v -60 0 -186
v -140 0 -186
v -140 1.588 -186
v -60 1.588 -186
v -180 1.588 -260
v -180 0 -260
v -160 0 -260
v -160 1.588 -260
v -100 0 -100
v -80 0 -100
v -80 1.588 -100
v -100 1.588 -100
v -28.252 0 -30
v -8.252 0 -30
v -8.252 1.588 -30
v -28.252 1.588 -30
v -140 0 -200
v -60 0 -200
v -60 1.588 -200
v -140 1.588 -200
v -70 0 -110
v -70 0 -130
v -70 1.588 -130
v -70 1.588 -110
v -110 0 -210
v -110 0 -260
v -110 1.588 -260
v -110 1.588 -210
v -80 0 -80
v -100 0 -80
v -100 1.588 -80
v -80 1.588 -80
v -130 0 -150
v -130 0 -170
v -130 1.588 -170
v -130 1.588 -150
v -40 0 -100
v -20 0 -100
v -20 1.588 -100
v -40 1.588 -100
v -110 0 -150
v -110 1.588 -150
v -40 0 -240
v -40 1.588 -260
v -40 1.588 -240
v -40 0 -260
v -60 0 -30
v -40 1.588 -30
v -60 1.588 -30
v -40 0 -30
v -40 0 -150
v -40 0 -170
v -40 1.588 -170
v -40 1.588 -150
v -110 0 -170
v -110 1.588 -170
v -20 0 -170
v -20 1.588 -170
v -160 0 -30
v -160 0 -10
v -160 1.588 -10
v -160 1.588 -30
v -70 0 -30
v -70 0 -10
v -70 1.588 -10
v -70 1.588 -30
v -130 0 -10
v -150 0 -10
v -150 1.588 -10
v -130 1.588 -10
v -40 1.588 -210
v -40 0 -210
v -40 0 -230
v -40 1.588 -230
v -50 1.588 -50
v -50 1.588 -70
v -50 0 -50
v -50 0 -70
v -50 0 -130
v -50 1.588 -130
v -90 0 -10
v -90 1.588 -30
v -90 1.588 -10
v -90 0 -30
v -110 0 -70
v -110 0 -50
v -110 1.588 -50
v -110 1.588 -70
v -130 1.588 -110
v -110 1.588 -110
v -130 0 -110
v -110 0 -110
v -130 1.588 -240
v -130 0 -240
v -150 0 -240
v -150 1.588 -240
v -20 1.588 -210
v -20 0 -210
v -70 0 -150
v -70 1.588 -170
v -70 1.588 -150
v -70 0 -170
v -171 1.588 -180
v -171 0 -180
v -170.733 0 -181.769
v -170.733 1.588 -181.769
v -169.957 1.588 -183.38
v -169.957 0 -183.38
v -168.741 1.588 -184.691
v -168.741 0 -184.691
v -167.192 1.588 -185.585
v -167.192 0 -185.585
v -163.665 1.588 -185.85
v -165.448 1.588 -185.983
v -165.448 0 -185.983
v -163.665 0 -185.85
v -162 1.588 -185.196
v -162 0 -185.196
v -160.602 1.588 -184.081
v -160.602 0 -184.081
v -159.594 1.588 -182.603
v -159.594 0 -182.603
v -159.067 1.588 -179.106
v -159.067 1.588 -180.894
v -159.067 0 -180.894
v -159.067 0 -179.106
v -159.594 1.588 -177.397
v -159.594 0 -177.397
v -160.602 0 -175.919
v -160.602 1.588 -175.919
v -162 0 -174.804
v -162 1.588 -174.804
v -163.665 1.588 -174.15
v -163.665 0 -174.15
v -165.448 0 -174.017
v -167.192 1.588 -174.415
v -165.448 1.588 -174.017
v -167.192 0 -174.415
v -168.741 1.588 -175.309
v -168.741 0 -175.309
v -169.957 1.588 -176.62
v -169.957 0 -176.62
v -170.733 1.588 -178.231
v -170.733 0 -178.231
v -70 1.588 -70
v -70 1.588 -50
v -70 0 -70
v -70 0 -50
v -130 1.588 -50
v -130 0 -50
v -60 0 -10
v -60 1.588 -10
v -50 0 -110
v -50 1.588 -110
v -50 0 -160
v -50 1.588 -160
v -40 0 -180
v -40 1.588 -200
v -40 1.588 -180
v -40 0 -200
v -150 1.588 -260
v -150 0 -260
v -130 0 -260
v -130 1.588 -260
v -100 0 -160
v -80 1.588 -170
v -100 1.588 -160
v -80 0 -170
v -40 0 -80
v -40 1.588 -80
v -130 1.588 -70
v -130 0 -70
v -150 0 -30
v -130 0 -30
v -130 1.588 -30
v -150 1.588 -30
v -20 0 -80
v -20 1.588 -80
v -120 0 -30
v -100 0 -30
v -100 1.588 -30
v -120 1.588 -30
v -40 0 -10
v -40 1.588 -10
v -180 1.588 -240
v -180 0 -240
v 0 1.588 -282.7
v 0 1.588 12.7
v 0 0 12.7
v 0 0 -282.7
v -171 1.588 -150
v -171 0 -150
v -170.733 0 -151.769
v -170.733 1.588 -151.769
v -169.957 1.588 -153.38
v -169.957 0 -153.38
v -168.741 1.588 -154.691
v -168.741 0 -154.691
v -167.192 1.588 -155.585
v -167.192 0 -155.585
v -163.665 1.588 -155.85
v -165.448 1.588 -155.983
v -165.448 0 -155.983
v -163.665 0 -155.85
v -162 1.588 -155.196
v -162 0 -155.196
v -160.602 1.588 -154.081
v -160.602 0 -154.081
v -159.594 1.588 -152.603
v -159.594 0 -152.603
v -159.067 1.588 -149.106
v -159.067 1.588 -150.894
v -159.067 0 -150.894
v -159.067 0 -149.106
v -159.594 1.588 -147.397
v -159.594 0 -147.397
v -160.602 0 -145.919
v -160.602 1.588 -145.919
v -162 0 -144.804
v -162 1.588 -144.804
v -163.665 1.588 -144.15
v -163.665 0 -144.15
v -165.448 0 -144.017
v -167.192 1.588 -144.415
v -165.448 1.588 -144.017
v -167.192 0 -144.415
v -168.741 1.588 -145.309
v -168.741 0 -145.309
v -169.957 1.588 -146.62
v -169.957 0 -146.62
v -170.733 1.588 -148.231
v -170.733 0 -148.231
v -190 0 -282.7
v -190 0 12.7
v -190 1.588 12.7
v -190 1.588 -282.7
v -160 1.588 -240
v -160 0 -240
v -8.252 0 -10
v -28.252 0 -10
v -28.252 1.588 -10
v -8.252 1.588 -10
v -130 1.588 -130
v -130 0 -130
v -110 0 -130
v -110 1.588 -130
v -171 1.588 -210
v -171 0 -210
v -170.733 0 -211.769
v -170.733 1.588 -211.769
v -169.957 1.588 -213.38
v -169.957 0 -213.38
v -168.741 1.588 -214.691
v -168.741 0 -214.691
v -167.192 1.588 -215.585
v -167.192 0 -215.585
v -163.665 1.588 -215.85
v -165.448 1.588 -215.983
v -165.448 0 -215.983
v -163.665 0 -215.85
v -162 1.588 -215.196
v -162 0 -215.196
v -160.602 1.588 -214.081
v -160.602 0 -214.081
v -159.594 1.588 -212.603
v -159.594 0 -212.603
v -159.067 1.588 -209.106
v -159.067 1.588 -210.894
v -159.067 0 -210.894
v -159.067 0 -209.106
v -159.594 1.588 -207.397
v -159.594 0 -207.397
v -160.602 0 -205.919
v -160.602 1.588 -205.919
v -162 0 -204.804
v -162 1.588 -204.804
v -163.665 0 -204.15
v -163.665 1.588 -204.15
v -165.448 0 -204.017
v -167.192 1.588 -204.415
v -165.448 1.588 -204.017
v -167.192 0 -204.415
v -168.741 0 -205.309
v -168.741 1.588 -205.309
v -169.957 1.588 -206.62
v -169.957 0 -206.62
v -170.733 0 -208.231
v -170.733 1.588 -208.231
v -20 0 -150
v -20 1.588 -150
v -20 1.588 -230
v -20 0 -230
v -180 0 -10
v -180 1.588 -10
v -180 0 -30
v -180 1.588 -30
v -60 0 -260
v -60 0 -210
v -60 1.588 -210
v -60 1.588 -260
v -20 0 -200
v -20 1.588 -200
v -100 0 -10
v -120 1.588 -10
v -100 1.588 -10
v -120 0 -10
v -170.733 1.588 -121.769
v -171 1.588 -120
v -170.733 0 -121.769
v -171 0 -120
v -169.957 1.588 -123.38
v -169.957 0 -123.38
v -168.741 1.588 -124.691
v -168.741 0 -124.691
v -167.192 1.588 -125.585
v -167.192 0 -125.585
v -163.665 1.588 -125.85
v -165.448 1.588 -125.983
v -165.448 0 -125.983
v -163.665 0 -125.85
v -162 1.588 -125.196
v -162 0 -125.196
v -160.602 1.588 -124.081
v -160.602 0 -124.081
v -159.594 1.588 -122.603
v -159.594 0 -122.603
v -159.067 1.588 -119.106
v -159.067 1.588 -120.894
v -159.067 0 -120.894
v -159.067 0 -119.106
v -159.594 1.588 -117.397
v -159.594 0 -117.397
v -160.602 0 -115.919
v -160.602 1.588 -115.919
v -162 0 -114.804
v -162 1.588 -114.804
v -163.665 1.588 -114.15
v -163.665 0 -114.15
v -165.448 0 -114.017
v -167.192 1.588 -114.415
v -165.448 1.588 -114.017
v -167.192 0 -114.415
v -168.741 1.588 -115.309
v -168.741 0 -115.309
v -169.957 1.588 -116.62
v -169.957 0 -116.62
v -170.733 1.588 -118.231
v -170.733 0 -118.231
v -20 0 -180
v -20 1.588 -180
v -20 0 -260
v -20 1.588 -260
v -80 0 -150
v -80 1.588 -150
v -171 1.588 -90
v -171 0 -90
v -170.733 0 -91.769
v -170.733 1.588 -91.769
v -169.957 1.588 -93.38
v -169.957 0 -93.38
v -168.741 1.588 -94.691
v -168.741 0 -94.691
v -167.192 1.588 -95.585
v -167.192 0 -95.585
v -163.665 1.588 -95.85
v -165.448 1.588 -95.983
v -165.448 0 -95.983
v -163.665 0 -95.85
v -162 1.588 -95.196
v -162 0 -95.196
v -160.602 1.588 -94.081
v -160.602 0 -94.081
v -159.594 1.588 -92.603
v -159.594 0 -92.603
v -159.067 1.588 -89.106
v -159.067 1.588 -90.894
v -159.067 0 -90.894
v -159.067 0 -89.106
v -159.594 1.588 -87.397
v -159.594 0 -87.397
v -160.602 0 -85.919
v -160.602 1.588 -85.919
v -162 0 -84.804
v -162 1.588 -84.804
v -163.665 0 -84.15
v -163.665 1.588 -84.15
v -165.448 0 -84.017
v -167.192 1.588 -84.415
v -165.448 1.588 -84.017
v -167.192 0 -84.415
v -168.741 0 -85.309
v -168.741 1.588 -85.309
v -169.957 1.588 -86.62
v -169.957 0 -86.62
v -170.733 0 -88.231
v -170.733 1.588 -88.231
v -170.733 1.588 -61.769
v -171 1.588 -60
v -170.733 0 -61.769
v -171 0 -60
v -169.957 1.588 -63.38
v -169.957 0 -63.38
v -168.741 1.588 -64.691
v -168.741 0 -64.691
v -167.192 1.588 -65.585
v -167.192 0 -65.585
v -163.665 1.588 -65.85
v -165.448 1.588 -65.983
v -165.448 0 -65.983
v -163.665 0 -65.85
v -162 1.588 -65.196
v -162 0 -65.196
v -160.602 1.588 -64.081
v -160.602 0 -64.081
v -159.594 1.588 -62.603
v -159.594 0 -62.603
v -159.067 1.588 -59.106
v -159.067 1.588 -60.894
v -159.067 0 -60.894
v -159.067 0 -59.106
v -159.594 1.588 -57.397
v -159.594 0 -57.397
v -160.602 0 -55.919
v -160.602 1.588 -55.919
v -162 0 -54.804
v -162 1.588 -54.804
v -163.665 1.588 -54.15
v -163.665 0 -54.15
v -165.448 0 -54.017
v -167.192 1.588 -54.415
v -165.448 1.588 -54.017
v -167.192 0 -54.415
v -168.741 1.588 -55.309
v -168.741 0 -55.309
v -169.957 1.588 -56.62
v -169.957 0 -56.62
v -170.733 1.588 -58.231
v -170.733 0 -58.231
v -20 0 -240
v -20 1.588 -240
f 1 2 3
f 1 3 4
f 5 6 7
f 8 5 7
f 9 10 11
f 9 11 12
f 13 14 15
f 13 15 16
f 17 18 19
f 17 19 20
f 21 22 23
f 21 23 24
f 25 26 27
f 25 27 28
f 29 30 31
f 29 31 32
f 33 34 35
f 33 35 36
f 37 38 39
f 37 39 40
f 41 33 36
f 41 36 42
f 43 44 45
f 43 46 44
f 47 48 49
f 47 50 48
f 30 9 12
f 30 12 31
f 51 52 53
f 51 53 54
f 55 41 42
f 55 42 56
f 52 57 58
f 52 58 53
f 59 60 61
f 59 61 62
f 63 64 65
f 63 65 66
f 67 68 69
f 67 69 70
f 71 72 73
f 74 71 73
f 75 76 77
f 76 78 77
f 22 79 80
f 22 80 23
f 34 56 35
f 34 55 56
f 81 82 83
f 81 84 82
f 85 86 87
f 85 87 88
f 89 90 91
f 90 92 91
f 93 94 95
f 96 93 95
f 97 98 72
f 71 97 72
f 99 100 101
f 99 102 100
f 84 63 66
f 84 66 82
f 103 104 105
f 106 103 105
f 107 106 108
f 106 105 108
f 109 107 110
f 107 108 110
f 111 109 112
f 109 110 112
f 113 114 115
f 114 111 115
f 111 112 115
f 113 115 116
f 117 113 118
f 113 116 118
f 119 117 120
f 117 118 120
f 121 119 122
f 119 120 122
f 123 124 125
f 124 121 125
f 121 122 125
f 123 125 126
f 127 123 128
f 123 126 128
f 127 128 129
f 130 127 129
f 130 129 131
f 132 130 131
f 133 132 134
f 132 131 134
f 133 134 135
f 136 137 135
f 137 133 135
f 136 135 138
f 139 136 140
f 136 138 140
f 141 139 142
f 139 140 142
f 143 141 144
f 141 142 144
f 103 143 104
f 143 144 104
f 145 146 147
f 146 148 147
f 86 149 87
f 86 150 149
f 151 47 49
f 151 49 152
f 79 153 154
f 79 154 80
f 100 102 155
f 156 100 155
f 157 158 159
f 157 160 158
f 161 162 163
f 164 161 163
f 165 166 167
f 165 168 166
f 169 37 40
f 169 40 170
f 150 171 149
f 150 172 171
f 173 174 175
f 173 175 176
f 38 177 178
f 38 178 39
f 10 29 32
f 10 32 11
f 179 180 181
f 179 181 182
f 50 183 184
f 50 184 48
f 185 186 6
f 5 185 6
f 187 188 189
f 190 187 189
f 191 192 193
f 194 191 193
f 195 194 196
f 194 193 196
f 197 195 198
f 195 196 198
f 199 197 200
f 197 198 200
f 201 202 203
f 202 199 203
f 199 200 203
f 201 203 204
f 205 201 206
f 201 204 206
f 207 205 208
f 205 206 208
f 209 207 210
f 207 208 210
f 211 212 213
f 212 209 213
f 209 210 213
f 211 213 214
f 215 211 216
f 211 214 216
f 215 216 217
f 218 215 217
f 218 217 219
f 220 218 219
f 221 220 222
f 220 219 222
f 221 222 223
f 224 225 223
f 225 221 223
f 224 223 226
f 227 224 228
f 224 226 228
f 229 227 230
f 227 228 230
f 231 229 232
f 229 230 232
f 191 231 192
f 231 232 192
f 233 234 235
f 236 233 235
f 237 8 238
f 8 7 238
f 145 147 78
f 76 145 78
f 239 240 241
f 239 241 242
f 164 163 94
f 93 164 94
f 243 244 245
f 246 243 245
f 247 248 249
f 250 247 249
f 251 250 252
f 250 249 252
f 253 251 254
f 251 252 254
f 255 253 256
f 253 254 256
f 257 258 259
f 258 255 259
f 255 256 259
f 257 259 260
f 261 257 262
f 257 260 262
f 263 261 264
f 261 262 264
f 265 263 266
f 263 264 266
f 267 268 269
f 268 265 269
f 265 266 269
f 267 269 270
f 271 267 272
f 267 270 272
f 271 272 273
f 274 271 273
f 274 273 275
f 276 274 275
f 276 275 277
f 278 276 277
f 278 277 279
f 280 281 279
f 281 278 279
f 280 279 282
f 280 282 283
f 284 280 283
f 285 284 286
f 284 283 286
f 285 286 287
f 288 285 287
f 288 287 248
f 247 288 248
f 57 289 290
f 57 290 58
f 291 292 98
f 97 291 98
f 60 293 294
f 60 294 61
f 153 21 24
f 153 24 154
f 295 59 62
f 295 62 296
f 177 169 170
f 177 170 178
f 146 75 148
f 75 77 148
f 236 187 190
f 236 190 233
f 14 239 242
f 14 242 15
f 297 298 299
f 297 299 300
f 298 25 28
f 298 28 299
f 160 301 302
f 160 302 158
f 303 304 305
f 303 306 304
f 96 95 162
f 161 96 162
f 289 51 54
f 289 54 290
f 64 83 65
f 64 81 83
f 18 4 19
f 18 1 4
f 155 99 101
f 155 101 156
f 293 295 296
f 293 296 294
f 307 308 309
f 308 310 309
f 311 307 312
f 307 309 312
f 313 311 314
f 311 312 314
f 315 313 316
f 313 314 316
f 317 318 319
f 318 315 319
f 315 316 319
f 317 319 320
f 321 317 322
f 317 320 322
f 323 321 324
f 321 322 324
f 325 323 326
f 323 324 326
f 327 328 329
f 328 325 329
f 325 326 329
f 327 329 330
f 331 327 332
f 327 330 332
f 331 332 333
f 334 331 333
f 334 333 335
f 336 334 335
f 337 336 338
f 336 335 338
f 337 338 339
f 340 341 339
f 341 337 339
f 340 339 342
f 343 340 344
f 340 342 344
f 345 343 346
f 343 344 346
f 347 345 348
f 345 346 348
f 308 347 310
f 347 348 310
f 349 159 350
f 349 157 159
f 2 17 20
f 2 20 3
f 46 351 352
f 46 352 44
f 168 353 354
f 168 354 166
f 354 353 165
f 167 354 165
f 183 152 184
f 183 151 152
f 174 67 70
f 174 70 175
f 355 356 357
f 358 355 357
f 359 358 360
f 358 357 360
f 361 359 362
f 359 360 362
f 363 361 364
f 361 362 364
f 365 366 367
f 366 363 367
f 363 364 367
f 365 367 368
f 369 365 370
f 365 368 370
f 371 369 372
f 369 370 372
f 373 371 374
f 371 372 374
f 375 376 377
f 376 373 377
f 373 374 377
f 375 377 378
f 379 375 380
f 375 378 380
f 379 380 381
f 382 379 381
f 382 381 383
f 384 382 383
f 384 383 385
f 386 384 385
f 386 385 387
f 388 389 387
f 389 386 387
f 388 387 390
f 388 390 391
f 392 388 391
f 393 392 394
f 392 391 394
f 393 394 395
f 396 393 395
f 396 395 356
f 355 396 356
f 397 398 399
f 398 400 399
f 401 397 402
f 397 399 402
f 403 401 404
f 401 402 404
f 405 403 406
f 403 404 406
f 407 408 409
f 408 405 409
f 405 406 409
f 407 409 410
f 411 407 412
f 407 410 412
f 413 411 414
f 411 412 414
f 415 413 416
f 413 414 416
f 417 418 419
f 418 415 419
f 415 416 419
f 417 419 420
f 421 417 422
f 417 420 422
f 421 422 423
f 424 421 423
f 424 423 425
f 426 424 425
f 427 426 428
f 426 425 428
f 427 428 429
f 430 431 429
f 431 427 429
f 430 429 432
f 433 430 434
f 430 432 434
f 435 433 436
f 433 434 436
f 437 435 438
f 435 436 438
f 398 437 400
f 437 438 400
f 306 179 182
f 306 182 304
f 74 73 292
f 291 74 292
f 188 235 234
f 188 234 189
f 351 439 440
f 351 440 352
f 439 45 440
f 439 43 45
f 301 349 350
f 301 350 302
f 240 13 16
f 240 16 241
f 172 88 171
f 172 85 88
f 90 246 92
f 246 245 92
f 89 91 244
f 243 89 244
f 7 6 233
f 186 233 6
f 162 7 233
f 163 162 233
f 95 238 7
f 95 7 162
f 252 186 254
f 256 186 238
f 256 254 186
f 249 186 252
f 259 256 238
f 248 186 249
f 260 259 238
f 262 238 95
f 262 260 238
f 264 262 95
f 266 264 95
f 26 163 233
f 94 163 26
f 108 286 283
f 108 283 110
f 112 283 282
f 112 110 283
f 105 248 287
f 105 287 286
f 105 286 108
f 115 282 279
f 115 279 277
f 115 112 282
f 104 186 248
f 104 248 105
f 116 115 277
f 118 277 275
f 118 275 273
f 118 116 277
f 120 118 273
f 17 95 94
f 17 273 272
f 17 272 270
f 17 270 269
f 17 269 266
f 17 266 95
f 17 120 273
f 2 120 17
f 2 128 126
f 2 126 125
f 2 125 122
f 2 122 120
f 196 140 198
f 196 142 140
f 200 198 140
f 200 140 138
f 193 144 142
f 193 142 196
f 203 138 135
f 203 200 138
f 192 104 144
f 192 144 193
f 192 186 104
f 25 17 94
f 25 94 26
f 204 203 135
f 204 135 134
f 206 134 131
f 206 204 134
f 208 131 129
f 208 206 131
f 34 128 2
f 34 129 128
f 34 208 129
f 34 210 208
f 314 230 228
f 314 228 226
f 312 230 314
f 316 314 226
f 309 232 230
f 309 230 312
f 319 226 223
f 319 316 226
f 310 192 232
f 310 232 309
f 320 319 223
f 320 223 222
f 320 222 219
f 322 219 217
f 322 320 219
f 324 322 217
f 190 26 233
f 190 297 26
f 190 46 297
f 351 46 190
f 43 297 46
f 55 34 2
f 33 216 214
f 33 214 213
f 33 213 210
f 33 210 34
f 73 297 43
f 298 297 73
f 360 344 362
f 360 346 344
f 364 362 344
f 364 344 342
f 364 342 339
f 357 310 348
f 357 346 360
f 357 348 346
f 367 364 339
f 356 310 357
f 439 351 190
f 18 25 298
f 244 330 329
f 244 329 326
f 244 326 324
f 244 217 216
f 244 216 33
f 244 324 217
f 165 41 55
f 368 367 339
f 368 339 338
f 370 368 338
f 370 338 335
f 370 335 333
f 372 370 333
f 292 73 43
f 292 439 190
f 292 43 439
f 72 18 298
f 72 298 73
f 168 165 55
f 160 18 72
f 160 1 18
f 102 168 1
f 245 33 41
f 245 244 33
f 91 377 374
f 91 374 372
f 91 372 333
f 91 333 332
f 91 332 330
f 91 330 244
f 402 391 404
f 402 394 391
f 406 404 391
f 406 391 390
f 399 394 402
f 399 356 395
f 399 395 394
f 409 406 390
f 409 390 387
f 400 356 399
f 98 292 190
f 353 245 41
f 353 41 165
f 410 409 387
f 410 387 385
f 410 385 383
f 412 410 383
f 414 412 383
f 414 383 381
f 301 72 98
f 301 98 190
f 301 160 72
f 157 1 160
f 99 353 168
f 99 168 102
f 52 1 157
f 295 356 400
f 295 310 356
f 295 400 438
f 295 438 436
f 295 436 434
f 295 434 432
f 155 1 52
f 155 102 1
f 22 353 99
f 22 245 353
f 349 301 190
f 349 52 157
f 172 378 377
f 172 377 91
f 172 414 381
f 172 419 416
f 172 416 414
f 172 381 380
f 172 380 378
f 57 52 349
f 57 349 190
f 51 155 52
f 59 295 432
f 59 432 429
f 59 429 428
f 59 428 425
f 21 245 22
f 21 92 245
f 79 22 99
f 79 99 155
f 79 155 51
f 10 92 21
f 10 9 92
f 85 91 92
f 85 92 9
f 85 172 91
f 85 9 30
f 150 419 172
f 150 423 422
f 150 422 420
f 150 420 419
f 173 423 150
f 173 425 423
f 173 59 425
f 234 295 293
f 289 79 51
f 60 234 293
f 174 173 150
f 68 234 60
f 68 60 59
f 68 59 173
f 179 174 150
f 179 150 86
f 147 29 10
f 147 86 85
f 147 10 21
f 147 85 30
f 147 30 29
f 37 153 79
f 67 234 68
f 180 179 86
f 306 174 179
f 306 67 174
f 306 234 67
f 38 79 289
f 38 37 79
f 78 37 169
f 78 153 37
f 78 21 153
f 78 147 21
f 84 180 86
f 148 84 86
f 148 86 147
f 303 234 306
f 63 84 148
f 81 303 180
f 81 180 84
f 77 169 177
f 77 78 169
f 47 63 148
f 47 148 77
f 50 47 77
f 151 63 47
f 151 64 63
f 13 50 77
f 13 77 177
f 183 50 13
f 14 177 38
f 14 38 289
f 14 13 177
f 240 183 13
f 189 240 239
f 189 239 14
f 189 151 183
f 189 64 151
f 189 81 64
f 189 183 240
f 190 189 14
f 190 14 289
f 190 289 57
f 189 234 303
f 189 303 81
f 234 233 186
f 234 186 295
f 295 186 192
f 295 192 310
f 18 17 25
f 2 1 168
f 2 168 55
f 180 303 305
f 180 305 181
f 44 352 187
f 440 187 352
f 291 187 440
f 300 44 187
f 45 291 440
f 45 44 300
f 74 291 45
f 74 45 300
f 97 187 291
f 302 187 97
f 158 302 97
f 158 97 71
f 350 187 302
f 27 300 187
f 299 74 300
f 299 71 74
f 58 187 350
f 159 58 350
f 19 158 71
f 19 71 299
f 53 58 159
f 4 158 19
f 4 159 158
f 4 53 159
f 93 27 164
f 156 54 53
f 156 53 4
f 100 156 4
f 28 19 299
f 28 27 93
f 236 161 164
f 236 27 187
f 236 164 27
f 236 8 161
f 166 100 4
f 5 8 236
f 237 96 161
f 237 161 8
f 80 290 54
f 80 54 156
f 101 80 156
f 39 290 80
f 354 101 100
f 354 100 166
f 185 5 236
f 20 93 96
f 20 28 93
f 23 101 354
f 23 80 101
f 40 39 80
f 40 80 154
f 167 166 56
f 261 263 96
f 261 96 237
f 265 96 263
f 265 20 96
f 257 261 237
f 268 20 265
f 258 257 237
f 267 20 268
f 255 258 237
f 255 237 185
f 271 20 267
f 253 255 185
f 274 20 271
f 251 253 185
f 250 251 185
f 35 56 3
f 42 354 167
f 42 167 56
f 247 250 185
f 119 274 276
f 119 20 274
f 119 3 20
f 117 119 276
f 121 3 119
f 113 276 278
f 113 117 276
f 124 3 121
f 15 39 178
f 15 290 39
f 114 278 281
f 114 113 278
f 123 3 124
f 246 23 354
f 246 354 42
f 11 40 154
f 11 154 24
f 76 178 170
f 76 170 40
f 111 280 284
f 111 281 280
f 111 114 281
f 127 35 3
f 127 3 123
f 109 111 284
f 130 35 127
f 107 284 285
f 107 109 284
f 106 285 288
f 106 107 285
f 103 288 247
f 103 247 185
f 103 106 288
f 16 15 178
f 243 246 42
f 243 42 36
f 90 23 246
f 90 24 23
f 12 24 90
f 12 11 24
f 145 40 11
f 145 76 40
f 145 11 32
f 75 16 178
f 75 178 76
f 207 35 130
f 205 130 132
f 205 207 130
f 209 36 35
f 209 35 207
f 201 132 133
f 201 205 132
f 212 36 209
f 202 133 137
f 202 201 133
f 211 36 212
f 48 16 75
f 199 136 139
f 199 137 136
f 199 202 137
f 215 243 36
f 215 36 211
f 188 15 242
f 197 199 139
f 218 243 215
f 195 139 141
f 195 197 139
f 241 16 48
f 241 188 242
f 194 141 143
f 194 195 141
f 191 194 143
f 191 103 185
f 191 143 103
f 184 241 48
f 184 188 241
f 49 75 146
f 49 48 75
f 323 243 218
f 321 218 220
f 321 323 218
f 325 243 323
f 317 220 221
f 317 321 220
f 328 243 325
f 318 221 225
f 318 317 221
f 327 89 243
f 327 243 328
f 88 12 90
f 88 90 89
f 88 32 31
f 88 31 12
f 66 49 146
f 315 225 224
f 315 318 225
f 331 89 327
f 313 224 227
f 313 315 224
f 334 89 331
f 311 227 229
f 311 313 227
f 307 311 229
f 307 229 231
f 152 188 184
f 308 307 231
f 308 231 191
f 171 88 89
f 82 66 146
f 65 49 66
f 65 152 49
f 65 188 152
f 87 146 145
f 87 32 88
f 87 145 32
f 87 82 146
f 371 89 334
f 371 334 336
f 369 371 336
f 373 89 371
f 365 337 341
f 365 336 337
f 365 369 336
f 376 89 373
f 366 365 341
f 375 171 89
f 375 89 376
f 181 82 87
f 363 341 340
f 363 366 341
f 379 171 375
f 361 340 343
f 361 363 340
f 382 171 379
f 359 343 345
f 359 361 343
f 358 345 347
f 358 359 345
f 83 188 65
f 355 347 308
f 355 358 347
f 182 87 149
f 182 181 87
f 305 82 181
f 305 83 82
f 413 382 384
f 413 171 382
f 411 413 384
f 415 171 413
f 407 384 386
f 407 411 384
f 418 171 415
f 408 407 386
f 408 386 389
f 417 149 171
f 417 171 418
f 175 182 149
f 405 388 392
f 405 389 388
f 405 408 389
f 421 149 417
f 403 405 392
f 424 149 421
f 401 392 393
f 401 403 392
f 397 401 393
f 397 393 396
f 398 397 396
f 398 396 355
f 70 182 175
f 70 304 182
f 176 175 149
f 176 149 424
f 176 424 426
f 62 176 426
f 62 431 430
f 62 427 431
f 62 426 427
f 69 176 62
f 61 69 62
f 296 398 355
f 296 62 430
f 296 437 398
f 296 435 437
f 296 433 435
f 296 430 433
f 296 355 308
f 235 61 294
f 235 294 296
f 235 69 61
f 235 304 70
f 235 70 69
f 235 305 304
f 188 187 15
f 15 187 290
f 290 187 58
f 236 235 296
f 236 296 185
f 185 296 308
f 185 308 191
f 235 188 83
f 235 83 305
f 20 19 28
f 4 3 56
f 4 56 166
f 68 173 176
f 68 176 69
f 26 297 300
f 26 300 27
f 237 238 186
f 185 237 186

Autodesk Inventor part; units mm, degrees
ref_plane "YZ Plane" through (0, 0, 0) normal (1, 0, 0) x (0, 1, 0)
ref_plane "XZ Plane" through (0, 0, 0) normal (0, 1, 0) x (-1, 0, 0)
ref_plane "XY Plane" through (0, 0, 0) normal (0, 0, 1) x (1, 0, 0)
sketch "Sketch1" plane through (0, 0, 0) normal (0, 1, 0) x (-1, 0, 0)
  line L0 (0, 0) -> (190, 0)
  line L1 (190, 0) -> (190, -270)
  line L2 (190, -270) -> (0, -270)
  line L3 (0, -270) -> (0, 0)
  line L4 (180, -10) -> (160, -10)
  line L5 (160, -10) -> (160, -30)
  line L6 (160, -30) -> (180, -30)
  line L7 (180, -30) -> (180, -10)
  line L8 (150, -10) -> (130, -10)
  line L9 (130, -10) -> (130, -30)
  line L10 (130, -30) -> (150, -30)
  line L11 (150, -30) -> (150, -10)
  line L12 (120, -10) -> (100, -10)
  line L13 (100, -10) -> (100, -30)
  line L14 (100, -30) -> (120, -30)
  line L15 (120, -30) -> (120, -10)
  line L16 (90, -10) -> (70, -10)
  line L17 (70, -10) -> (70, -30)
  line L18 (70, -30) -> (90, -30)
  line L19 (90, -30) -> (90, -10)
  line L20 (60, -10) -> (40, -10)
  line L21 (40, -10) -> (40, -30)
  line L22 (40, -30) -> (60, -30)
  line L23 (60, -30) -> (60, -10)
  line L24 (28.2524, -10) -> (8.2524, -10)
  line L25 (8.2524, -10) -> (8.2524, -30)
  line L26 (8.2524, -30) -> (28.2524, -30)
  line L27 (28.2524, -30) -> (28.2524, -10)
  circle A0 centre (165, -60) radius 6
  circle A1 centre (165, -90) radius 6
  circle A2 centre (165, -120) radius 6
  circle A3 centre (165, -150) radius 6
  circle A4 centre (165, -180) radius 6
  circle A5 centre (165, -210) radius 6
  line L28 (180, -260) -> (160, -260)
  line L29 (160, -260) -> (160, -240)
  line L30 (160, -240) -> (180, -240)
  line L31 (180, -240) -> (180, -260)
  line L32 (150, -260) -> (130, -260)
  line L33 (130, -260) -> (130, -240)
  line L34 (130, -240) -> (150, -240)
  line L35 (150, -240) -> (150, -260)
  line L36 (130, -50) -> (110, -50)
  line L37 (110, -50) -> (110, -70)
  line L38 (110, -70) -> (130, -70)
  line L39 (130, -70) -> (130, -50)
  line L40 (100, -80) -> (80, -80)
  line L41 (80, -80) -> (80, -100)
  line L42 (80, -100) -> (100, -100)
  line L43 (100, -100) -> (100, -80)
  line L44 (70, -70) -> (50, -70)
  line L45 (50, -70) -> (50, -50)
  line L46 (50, -50) -> (70, -50)
  line L47 (70, -50) -> (70, -70)
  line L48 (70, -110) -> (50, -110)
  line L49 (50, -110) -> (50, -130)
  line L50 (50, -130) -> (70, -130)
  line L51 (70, -130) -> (70, -110)
  line L52 (40, -80) -> (20, -80)
  line L53 (20, -80) -> (20, -100)
  line L54 (20, -100) -> (40, -100)
  line L55 (40, -100) -> (40, -80)
  line L56 (110, -110) -> (130, -110)
  line L57 (130, -110) -> (130, -130)
  line L58 (130, -130) -> (110, -130)
  line L59 (110, -130) -> (110, -110)
  line L60 (20, -260) -> (40, -260)
  line L61 (40, -260) -> (40, -240)
  line L62 (40, -240) -> (20, -240)
  line L63 (20, -240) -> (20, -260)
  line L64 (40, -230) -> (20, -230)
  line L65 (20, -230) -> (20, -210)
  line L66 (20, -210) -> (40, -210)
  line L67 (40, -210) -> (40, -230)
  line L68 (20, -200) -> (40, -200)
  line L69 (40, -200) -> (40, -180)
  line L70 (40, -180) -> (20, -180)
  line L71 (20, -180) -> (20, -200)
  line L72 (20, -170) -> (40, -170)
  line L73 (40, -170) -> (40, -150)
  line L74 (40, -150) -> (20, -150)
  line L75 (20, -150) -> (20, -170)
  line L76 (60, -260) -> (110, -260)
  line L77 (110, -260) -> (110, -210)
  line L78 (110, -210) -> (60, -210)
  line L79 (60, -210) -> (60, -260)
  line L80 (60, -200) -> (140, -200)
  line L81 (140, -200) -> (140, -186)
  line L82 (140, -186) -> (60, -186)
  line L83 (60, -186) -> (60, -200)
  line L84 (70, -170) -> (70, -150)
  line L85 (80, -150) -> (80, -170)
  line L86 (110, -170) -> (130, -170)
  line L87 (130, -170) -> (130, -150)
  line L88 (130, -150) -> (110, -150)
  line L89 (110, -150) -> (110, -170)
  line L90 (70, -150) -> (50, -160)
  line L91 (70, -170) -> (50, -160)
  line L92 (80, -150) -> (100, -160)
  line L93 (80, -170) -> (100, -160)
extrude "Extrusion1" add sketch "Sketch1" along normal blind 1.5875
sketch "Sketch2" plane through (-190, 0, 0) normal (0, 0, 1) x (1, 0, 0)
  line L0 (190, 0) -> (190, 1.5875) projected
  line L1 (0, 0) -> (0, 1.5875) projected
  line L2 (190, 1.5875) -> (0, 1.5875)
  line L3 (0, 1.5875) -> (0, 0)
  line L4 (0, 0) -> (190, 0)
  line L5 (190, 0) -> (190, 1.5875)
extrude "Extrusion2" add sketch "Sketch2" along normal blind 12.7
sketch "Sketch3" plane through (0, 0, -270) normal (0, 0, -1) x (-1, 0, 0)
  line L0 (190, 0) -> (0, 0) projected
  line L1 (0, 1.5875) -> (190, 1.5875) projected
  line L2 (0, 0) -> (190, 0)
  line L3 (190, 0) -> (190, 1.5875)
  line L4 (190, 1.5875) -> (0, 1.5875)
  line L5 (0, 1.5875) -> (0, 0)
  point P0 (0, 1.5875)
extrude "Extrusion3" add sketch "Sketch3" along normal blind 12.7
properties part number "Front Plywood"
